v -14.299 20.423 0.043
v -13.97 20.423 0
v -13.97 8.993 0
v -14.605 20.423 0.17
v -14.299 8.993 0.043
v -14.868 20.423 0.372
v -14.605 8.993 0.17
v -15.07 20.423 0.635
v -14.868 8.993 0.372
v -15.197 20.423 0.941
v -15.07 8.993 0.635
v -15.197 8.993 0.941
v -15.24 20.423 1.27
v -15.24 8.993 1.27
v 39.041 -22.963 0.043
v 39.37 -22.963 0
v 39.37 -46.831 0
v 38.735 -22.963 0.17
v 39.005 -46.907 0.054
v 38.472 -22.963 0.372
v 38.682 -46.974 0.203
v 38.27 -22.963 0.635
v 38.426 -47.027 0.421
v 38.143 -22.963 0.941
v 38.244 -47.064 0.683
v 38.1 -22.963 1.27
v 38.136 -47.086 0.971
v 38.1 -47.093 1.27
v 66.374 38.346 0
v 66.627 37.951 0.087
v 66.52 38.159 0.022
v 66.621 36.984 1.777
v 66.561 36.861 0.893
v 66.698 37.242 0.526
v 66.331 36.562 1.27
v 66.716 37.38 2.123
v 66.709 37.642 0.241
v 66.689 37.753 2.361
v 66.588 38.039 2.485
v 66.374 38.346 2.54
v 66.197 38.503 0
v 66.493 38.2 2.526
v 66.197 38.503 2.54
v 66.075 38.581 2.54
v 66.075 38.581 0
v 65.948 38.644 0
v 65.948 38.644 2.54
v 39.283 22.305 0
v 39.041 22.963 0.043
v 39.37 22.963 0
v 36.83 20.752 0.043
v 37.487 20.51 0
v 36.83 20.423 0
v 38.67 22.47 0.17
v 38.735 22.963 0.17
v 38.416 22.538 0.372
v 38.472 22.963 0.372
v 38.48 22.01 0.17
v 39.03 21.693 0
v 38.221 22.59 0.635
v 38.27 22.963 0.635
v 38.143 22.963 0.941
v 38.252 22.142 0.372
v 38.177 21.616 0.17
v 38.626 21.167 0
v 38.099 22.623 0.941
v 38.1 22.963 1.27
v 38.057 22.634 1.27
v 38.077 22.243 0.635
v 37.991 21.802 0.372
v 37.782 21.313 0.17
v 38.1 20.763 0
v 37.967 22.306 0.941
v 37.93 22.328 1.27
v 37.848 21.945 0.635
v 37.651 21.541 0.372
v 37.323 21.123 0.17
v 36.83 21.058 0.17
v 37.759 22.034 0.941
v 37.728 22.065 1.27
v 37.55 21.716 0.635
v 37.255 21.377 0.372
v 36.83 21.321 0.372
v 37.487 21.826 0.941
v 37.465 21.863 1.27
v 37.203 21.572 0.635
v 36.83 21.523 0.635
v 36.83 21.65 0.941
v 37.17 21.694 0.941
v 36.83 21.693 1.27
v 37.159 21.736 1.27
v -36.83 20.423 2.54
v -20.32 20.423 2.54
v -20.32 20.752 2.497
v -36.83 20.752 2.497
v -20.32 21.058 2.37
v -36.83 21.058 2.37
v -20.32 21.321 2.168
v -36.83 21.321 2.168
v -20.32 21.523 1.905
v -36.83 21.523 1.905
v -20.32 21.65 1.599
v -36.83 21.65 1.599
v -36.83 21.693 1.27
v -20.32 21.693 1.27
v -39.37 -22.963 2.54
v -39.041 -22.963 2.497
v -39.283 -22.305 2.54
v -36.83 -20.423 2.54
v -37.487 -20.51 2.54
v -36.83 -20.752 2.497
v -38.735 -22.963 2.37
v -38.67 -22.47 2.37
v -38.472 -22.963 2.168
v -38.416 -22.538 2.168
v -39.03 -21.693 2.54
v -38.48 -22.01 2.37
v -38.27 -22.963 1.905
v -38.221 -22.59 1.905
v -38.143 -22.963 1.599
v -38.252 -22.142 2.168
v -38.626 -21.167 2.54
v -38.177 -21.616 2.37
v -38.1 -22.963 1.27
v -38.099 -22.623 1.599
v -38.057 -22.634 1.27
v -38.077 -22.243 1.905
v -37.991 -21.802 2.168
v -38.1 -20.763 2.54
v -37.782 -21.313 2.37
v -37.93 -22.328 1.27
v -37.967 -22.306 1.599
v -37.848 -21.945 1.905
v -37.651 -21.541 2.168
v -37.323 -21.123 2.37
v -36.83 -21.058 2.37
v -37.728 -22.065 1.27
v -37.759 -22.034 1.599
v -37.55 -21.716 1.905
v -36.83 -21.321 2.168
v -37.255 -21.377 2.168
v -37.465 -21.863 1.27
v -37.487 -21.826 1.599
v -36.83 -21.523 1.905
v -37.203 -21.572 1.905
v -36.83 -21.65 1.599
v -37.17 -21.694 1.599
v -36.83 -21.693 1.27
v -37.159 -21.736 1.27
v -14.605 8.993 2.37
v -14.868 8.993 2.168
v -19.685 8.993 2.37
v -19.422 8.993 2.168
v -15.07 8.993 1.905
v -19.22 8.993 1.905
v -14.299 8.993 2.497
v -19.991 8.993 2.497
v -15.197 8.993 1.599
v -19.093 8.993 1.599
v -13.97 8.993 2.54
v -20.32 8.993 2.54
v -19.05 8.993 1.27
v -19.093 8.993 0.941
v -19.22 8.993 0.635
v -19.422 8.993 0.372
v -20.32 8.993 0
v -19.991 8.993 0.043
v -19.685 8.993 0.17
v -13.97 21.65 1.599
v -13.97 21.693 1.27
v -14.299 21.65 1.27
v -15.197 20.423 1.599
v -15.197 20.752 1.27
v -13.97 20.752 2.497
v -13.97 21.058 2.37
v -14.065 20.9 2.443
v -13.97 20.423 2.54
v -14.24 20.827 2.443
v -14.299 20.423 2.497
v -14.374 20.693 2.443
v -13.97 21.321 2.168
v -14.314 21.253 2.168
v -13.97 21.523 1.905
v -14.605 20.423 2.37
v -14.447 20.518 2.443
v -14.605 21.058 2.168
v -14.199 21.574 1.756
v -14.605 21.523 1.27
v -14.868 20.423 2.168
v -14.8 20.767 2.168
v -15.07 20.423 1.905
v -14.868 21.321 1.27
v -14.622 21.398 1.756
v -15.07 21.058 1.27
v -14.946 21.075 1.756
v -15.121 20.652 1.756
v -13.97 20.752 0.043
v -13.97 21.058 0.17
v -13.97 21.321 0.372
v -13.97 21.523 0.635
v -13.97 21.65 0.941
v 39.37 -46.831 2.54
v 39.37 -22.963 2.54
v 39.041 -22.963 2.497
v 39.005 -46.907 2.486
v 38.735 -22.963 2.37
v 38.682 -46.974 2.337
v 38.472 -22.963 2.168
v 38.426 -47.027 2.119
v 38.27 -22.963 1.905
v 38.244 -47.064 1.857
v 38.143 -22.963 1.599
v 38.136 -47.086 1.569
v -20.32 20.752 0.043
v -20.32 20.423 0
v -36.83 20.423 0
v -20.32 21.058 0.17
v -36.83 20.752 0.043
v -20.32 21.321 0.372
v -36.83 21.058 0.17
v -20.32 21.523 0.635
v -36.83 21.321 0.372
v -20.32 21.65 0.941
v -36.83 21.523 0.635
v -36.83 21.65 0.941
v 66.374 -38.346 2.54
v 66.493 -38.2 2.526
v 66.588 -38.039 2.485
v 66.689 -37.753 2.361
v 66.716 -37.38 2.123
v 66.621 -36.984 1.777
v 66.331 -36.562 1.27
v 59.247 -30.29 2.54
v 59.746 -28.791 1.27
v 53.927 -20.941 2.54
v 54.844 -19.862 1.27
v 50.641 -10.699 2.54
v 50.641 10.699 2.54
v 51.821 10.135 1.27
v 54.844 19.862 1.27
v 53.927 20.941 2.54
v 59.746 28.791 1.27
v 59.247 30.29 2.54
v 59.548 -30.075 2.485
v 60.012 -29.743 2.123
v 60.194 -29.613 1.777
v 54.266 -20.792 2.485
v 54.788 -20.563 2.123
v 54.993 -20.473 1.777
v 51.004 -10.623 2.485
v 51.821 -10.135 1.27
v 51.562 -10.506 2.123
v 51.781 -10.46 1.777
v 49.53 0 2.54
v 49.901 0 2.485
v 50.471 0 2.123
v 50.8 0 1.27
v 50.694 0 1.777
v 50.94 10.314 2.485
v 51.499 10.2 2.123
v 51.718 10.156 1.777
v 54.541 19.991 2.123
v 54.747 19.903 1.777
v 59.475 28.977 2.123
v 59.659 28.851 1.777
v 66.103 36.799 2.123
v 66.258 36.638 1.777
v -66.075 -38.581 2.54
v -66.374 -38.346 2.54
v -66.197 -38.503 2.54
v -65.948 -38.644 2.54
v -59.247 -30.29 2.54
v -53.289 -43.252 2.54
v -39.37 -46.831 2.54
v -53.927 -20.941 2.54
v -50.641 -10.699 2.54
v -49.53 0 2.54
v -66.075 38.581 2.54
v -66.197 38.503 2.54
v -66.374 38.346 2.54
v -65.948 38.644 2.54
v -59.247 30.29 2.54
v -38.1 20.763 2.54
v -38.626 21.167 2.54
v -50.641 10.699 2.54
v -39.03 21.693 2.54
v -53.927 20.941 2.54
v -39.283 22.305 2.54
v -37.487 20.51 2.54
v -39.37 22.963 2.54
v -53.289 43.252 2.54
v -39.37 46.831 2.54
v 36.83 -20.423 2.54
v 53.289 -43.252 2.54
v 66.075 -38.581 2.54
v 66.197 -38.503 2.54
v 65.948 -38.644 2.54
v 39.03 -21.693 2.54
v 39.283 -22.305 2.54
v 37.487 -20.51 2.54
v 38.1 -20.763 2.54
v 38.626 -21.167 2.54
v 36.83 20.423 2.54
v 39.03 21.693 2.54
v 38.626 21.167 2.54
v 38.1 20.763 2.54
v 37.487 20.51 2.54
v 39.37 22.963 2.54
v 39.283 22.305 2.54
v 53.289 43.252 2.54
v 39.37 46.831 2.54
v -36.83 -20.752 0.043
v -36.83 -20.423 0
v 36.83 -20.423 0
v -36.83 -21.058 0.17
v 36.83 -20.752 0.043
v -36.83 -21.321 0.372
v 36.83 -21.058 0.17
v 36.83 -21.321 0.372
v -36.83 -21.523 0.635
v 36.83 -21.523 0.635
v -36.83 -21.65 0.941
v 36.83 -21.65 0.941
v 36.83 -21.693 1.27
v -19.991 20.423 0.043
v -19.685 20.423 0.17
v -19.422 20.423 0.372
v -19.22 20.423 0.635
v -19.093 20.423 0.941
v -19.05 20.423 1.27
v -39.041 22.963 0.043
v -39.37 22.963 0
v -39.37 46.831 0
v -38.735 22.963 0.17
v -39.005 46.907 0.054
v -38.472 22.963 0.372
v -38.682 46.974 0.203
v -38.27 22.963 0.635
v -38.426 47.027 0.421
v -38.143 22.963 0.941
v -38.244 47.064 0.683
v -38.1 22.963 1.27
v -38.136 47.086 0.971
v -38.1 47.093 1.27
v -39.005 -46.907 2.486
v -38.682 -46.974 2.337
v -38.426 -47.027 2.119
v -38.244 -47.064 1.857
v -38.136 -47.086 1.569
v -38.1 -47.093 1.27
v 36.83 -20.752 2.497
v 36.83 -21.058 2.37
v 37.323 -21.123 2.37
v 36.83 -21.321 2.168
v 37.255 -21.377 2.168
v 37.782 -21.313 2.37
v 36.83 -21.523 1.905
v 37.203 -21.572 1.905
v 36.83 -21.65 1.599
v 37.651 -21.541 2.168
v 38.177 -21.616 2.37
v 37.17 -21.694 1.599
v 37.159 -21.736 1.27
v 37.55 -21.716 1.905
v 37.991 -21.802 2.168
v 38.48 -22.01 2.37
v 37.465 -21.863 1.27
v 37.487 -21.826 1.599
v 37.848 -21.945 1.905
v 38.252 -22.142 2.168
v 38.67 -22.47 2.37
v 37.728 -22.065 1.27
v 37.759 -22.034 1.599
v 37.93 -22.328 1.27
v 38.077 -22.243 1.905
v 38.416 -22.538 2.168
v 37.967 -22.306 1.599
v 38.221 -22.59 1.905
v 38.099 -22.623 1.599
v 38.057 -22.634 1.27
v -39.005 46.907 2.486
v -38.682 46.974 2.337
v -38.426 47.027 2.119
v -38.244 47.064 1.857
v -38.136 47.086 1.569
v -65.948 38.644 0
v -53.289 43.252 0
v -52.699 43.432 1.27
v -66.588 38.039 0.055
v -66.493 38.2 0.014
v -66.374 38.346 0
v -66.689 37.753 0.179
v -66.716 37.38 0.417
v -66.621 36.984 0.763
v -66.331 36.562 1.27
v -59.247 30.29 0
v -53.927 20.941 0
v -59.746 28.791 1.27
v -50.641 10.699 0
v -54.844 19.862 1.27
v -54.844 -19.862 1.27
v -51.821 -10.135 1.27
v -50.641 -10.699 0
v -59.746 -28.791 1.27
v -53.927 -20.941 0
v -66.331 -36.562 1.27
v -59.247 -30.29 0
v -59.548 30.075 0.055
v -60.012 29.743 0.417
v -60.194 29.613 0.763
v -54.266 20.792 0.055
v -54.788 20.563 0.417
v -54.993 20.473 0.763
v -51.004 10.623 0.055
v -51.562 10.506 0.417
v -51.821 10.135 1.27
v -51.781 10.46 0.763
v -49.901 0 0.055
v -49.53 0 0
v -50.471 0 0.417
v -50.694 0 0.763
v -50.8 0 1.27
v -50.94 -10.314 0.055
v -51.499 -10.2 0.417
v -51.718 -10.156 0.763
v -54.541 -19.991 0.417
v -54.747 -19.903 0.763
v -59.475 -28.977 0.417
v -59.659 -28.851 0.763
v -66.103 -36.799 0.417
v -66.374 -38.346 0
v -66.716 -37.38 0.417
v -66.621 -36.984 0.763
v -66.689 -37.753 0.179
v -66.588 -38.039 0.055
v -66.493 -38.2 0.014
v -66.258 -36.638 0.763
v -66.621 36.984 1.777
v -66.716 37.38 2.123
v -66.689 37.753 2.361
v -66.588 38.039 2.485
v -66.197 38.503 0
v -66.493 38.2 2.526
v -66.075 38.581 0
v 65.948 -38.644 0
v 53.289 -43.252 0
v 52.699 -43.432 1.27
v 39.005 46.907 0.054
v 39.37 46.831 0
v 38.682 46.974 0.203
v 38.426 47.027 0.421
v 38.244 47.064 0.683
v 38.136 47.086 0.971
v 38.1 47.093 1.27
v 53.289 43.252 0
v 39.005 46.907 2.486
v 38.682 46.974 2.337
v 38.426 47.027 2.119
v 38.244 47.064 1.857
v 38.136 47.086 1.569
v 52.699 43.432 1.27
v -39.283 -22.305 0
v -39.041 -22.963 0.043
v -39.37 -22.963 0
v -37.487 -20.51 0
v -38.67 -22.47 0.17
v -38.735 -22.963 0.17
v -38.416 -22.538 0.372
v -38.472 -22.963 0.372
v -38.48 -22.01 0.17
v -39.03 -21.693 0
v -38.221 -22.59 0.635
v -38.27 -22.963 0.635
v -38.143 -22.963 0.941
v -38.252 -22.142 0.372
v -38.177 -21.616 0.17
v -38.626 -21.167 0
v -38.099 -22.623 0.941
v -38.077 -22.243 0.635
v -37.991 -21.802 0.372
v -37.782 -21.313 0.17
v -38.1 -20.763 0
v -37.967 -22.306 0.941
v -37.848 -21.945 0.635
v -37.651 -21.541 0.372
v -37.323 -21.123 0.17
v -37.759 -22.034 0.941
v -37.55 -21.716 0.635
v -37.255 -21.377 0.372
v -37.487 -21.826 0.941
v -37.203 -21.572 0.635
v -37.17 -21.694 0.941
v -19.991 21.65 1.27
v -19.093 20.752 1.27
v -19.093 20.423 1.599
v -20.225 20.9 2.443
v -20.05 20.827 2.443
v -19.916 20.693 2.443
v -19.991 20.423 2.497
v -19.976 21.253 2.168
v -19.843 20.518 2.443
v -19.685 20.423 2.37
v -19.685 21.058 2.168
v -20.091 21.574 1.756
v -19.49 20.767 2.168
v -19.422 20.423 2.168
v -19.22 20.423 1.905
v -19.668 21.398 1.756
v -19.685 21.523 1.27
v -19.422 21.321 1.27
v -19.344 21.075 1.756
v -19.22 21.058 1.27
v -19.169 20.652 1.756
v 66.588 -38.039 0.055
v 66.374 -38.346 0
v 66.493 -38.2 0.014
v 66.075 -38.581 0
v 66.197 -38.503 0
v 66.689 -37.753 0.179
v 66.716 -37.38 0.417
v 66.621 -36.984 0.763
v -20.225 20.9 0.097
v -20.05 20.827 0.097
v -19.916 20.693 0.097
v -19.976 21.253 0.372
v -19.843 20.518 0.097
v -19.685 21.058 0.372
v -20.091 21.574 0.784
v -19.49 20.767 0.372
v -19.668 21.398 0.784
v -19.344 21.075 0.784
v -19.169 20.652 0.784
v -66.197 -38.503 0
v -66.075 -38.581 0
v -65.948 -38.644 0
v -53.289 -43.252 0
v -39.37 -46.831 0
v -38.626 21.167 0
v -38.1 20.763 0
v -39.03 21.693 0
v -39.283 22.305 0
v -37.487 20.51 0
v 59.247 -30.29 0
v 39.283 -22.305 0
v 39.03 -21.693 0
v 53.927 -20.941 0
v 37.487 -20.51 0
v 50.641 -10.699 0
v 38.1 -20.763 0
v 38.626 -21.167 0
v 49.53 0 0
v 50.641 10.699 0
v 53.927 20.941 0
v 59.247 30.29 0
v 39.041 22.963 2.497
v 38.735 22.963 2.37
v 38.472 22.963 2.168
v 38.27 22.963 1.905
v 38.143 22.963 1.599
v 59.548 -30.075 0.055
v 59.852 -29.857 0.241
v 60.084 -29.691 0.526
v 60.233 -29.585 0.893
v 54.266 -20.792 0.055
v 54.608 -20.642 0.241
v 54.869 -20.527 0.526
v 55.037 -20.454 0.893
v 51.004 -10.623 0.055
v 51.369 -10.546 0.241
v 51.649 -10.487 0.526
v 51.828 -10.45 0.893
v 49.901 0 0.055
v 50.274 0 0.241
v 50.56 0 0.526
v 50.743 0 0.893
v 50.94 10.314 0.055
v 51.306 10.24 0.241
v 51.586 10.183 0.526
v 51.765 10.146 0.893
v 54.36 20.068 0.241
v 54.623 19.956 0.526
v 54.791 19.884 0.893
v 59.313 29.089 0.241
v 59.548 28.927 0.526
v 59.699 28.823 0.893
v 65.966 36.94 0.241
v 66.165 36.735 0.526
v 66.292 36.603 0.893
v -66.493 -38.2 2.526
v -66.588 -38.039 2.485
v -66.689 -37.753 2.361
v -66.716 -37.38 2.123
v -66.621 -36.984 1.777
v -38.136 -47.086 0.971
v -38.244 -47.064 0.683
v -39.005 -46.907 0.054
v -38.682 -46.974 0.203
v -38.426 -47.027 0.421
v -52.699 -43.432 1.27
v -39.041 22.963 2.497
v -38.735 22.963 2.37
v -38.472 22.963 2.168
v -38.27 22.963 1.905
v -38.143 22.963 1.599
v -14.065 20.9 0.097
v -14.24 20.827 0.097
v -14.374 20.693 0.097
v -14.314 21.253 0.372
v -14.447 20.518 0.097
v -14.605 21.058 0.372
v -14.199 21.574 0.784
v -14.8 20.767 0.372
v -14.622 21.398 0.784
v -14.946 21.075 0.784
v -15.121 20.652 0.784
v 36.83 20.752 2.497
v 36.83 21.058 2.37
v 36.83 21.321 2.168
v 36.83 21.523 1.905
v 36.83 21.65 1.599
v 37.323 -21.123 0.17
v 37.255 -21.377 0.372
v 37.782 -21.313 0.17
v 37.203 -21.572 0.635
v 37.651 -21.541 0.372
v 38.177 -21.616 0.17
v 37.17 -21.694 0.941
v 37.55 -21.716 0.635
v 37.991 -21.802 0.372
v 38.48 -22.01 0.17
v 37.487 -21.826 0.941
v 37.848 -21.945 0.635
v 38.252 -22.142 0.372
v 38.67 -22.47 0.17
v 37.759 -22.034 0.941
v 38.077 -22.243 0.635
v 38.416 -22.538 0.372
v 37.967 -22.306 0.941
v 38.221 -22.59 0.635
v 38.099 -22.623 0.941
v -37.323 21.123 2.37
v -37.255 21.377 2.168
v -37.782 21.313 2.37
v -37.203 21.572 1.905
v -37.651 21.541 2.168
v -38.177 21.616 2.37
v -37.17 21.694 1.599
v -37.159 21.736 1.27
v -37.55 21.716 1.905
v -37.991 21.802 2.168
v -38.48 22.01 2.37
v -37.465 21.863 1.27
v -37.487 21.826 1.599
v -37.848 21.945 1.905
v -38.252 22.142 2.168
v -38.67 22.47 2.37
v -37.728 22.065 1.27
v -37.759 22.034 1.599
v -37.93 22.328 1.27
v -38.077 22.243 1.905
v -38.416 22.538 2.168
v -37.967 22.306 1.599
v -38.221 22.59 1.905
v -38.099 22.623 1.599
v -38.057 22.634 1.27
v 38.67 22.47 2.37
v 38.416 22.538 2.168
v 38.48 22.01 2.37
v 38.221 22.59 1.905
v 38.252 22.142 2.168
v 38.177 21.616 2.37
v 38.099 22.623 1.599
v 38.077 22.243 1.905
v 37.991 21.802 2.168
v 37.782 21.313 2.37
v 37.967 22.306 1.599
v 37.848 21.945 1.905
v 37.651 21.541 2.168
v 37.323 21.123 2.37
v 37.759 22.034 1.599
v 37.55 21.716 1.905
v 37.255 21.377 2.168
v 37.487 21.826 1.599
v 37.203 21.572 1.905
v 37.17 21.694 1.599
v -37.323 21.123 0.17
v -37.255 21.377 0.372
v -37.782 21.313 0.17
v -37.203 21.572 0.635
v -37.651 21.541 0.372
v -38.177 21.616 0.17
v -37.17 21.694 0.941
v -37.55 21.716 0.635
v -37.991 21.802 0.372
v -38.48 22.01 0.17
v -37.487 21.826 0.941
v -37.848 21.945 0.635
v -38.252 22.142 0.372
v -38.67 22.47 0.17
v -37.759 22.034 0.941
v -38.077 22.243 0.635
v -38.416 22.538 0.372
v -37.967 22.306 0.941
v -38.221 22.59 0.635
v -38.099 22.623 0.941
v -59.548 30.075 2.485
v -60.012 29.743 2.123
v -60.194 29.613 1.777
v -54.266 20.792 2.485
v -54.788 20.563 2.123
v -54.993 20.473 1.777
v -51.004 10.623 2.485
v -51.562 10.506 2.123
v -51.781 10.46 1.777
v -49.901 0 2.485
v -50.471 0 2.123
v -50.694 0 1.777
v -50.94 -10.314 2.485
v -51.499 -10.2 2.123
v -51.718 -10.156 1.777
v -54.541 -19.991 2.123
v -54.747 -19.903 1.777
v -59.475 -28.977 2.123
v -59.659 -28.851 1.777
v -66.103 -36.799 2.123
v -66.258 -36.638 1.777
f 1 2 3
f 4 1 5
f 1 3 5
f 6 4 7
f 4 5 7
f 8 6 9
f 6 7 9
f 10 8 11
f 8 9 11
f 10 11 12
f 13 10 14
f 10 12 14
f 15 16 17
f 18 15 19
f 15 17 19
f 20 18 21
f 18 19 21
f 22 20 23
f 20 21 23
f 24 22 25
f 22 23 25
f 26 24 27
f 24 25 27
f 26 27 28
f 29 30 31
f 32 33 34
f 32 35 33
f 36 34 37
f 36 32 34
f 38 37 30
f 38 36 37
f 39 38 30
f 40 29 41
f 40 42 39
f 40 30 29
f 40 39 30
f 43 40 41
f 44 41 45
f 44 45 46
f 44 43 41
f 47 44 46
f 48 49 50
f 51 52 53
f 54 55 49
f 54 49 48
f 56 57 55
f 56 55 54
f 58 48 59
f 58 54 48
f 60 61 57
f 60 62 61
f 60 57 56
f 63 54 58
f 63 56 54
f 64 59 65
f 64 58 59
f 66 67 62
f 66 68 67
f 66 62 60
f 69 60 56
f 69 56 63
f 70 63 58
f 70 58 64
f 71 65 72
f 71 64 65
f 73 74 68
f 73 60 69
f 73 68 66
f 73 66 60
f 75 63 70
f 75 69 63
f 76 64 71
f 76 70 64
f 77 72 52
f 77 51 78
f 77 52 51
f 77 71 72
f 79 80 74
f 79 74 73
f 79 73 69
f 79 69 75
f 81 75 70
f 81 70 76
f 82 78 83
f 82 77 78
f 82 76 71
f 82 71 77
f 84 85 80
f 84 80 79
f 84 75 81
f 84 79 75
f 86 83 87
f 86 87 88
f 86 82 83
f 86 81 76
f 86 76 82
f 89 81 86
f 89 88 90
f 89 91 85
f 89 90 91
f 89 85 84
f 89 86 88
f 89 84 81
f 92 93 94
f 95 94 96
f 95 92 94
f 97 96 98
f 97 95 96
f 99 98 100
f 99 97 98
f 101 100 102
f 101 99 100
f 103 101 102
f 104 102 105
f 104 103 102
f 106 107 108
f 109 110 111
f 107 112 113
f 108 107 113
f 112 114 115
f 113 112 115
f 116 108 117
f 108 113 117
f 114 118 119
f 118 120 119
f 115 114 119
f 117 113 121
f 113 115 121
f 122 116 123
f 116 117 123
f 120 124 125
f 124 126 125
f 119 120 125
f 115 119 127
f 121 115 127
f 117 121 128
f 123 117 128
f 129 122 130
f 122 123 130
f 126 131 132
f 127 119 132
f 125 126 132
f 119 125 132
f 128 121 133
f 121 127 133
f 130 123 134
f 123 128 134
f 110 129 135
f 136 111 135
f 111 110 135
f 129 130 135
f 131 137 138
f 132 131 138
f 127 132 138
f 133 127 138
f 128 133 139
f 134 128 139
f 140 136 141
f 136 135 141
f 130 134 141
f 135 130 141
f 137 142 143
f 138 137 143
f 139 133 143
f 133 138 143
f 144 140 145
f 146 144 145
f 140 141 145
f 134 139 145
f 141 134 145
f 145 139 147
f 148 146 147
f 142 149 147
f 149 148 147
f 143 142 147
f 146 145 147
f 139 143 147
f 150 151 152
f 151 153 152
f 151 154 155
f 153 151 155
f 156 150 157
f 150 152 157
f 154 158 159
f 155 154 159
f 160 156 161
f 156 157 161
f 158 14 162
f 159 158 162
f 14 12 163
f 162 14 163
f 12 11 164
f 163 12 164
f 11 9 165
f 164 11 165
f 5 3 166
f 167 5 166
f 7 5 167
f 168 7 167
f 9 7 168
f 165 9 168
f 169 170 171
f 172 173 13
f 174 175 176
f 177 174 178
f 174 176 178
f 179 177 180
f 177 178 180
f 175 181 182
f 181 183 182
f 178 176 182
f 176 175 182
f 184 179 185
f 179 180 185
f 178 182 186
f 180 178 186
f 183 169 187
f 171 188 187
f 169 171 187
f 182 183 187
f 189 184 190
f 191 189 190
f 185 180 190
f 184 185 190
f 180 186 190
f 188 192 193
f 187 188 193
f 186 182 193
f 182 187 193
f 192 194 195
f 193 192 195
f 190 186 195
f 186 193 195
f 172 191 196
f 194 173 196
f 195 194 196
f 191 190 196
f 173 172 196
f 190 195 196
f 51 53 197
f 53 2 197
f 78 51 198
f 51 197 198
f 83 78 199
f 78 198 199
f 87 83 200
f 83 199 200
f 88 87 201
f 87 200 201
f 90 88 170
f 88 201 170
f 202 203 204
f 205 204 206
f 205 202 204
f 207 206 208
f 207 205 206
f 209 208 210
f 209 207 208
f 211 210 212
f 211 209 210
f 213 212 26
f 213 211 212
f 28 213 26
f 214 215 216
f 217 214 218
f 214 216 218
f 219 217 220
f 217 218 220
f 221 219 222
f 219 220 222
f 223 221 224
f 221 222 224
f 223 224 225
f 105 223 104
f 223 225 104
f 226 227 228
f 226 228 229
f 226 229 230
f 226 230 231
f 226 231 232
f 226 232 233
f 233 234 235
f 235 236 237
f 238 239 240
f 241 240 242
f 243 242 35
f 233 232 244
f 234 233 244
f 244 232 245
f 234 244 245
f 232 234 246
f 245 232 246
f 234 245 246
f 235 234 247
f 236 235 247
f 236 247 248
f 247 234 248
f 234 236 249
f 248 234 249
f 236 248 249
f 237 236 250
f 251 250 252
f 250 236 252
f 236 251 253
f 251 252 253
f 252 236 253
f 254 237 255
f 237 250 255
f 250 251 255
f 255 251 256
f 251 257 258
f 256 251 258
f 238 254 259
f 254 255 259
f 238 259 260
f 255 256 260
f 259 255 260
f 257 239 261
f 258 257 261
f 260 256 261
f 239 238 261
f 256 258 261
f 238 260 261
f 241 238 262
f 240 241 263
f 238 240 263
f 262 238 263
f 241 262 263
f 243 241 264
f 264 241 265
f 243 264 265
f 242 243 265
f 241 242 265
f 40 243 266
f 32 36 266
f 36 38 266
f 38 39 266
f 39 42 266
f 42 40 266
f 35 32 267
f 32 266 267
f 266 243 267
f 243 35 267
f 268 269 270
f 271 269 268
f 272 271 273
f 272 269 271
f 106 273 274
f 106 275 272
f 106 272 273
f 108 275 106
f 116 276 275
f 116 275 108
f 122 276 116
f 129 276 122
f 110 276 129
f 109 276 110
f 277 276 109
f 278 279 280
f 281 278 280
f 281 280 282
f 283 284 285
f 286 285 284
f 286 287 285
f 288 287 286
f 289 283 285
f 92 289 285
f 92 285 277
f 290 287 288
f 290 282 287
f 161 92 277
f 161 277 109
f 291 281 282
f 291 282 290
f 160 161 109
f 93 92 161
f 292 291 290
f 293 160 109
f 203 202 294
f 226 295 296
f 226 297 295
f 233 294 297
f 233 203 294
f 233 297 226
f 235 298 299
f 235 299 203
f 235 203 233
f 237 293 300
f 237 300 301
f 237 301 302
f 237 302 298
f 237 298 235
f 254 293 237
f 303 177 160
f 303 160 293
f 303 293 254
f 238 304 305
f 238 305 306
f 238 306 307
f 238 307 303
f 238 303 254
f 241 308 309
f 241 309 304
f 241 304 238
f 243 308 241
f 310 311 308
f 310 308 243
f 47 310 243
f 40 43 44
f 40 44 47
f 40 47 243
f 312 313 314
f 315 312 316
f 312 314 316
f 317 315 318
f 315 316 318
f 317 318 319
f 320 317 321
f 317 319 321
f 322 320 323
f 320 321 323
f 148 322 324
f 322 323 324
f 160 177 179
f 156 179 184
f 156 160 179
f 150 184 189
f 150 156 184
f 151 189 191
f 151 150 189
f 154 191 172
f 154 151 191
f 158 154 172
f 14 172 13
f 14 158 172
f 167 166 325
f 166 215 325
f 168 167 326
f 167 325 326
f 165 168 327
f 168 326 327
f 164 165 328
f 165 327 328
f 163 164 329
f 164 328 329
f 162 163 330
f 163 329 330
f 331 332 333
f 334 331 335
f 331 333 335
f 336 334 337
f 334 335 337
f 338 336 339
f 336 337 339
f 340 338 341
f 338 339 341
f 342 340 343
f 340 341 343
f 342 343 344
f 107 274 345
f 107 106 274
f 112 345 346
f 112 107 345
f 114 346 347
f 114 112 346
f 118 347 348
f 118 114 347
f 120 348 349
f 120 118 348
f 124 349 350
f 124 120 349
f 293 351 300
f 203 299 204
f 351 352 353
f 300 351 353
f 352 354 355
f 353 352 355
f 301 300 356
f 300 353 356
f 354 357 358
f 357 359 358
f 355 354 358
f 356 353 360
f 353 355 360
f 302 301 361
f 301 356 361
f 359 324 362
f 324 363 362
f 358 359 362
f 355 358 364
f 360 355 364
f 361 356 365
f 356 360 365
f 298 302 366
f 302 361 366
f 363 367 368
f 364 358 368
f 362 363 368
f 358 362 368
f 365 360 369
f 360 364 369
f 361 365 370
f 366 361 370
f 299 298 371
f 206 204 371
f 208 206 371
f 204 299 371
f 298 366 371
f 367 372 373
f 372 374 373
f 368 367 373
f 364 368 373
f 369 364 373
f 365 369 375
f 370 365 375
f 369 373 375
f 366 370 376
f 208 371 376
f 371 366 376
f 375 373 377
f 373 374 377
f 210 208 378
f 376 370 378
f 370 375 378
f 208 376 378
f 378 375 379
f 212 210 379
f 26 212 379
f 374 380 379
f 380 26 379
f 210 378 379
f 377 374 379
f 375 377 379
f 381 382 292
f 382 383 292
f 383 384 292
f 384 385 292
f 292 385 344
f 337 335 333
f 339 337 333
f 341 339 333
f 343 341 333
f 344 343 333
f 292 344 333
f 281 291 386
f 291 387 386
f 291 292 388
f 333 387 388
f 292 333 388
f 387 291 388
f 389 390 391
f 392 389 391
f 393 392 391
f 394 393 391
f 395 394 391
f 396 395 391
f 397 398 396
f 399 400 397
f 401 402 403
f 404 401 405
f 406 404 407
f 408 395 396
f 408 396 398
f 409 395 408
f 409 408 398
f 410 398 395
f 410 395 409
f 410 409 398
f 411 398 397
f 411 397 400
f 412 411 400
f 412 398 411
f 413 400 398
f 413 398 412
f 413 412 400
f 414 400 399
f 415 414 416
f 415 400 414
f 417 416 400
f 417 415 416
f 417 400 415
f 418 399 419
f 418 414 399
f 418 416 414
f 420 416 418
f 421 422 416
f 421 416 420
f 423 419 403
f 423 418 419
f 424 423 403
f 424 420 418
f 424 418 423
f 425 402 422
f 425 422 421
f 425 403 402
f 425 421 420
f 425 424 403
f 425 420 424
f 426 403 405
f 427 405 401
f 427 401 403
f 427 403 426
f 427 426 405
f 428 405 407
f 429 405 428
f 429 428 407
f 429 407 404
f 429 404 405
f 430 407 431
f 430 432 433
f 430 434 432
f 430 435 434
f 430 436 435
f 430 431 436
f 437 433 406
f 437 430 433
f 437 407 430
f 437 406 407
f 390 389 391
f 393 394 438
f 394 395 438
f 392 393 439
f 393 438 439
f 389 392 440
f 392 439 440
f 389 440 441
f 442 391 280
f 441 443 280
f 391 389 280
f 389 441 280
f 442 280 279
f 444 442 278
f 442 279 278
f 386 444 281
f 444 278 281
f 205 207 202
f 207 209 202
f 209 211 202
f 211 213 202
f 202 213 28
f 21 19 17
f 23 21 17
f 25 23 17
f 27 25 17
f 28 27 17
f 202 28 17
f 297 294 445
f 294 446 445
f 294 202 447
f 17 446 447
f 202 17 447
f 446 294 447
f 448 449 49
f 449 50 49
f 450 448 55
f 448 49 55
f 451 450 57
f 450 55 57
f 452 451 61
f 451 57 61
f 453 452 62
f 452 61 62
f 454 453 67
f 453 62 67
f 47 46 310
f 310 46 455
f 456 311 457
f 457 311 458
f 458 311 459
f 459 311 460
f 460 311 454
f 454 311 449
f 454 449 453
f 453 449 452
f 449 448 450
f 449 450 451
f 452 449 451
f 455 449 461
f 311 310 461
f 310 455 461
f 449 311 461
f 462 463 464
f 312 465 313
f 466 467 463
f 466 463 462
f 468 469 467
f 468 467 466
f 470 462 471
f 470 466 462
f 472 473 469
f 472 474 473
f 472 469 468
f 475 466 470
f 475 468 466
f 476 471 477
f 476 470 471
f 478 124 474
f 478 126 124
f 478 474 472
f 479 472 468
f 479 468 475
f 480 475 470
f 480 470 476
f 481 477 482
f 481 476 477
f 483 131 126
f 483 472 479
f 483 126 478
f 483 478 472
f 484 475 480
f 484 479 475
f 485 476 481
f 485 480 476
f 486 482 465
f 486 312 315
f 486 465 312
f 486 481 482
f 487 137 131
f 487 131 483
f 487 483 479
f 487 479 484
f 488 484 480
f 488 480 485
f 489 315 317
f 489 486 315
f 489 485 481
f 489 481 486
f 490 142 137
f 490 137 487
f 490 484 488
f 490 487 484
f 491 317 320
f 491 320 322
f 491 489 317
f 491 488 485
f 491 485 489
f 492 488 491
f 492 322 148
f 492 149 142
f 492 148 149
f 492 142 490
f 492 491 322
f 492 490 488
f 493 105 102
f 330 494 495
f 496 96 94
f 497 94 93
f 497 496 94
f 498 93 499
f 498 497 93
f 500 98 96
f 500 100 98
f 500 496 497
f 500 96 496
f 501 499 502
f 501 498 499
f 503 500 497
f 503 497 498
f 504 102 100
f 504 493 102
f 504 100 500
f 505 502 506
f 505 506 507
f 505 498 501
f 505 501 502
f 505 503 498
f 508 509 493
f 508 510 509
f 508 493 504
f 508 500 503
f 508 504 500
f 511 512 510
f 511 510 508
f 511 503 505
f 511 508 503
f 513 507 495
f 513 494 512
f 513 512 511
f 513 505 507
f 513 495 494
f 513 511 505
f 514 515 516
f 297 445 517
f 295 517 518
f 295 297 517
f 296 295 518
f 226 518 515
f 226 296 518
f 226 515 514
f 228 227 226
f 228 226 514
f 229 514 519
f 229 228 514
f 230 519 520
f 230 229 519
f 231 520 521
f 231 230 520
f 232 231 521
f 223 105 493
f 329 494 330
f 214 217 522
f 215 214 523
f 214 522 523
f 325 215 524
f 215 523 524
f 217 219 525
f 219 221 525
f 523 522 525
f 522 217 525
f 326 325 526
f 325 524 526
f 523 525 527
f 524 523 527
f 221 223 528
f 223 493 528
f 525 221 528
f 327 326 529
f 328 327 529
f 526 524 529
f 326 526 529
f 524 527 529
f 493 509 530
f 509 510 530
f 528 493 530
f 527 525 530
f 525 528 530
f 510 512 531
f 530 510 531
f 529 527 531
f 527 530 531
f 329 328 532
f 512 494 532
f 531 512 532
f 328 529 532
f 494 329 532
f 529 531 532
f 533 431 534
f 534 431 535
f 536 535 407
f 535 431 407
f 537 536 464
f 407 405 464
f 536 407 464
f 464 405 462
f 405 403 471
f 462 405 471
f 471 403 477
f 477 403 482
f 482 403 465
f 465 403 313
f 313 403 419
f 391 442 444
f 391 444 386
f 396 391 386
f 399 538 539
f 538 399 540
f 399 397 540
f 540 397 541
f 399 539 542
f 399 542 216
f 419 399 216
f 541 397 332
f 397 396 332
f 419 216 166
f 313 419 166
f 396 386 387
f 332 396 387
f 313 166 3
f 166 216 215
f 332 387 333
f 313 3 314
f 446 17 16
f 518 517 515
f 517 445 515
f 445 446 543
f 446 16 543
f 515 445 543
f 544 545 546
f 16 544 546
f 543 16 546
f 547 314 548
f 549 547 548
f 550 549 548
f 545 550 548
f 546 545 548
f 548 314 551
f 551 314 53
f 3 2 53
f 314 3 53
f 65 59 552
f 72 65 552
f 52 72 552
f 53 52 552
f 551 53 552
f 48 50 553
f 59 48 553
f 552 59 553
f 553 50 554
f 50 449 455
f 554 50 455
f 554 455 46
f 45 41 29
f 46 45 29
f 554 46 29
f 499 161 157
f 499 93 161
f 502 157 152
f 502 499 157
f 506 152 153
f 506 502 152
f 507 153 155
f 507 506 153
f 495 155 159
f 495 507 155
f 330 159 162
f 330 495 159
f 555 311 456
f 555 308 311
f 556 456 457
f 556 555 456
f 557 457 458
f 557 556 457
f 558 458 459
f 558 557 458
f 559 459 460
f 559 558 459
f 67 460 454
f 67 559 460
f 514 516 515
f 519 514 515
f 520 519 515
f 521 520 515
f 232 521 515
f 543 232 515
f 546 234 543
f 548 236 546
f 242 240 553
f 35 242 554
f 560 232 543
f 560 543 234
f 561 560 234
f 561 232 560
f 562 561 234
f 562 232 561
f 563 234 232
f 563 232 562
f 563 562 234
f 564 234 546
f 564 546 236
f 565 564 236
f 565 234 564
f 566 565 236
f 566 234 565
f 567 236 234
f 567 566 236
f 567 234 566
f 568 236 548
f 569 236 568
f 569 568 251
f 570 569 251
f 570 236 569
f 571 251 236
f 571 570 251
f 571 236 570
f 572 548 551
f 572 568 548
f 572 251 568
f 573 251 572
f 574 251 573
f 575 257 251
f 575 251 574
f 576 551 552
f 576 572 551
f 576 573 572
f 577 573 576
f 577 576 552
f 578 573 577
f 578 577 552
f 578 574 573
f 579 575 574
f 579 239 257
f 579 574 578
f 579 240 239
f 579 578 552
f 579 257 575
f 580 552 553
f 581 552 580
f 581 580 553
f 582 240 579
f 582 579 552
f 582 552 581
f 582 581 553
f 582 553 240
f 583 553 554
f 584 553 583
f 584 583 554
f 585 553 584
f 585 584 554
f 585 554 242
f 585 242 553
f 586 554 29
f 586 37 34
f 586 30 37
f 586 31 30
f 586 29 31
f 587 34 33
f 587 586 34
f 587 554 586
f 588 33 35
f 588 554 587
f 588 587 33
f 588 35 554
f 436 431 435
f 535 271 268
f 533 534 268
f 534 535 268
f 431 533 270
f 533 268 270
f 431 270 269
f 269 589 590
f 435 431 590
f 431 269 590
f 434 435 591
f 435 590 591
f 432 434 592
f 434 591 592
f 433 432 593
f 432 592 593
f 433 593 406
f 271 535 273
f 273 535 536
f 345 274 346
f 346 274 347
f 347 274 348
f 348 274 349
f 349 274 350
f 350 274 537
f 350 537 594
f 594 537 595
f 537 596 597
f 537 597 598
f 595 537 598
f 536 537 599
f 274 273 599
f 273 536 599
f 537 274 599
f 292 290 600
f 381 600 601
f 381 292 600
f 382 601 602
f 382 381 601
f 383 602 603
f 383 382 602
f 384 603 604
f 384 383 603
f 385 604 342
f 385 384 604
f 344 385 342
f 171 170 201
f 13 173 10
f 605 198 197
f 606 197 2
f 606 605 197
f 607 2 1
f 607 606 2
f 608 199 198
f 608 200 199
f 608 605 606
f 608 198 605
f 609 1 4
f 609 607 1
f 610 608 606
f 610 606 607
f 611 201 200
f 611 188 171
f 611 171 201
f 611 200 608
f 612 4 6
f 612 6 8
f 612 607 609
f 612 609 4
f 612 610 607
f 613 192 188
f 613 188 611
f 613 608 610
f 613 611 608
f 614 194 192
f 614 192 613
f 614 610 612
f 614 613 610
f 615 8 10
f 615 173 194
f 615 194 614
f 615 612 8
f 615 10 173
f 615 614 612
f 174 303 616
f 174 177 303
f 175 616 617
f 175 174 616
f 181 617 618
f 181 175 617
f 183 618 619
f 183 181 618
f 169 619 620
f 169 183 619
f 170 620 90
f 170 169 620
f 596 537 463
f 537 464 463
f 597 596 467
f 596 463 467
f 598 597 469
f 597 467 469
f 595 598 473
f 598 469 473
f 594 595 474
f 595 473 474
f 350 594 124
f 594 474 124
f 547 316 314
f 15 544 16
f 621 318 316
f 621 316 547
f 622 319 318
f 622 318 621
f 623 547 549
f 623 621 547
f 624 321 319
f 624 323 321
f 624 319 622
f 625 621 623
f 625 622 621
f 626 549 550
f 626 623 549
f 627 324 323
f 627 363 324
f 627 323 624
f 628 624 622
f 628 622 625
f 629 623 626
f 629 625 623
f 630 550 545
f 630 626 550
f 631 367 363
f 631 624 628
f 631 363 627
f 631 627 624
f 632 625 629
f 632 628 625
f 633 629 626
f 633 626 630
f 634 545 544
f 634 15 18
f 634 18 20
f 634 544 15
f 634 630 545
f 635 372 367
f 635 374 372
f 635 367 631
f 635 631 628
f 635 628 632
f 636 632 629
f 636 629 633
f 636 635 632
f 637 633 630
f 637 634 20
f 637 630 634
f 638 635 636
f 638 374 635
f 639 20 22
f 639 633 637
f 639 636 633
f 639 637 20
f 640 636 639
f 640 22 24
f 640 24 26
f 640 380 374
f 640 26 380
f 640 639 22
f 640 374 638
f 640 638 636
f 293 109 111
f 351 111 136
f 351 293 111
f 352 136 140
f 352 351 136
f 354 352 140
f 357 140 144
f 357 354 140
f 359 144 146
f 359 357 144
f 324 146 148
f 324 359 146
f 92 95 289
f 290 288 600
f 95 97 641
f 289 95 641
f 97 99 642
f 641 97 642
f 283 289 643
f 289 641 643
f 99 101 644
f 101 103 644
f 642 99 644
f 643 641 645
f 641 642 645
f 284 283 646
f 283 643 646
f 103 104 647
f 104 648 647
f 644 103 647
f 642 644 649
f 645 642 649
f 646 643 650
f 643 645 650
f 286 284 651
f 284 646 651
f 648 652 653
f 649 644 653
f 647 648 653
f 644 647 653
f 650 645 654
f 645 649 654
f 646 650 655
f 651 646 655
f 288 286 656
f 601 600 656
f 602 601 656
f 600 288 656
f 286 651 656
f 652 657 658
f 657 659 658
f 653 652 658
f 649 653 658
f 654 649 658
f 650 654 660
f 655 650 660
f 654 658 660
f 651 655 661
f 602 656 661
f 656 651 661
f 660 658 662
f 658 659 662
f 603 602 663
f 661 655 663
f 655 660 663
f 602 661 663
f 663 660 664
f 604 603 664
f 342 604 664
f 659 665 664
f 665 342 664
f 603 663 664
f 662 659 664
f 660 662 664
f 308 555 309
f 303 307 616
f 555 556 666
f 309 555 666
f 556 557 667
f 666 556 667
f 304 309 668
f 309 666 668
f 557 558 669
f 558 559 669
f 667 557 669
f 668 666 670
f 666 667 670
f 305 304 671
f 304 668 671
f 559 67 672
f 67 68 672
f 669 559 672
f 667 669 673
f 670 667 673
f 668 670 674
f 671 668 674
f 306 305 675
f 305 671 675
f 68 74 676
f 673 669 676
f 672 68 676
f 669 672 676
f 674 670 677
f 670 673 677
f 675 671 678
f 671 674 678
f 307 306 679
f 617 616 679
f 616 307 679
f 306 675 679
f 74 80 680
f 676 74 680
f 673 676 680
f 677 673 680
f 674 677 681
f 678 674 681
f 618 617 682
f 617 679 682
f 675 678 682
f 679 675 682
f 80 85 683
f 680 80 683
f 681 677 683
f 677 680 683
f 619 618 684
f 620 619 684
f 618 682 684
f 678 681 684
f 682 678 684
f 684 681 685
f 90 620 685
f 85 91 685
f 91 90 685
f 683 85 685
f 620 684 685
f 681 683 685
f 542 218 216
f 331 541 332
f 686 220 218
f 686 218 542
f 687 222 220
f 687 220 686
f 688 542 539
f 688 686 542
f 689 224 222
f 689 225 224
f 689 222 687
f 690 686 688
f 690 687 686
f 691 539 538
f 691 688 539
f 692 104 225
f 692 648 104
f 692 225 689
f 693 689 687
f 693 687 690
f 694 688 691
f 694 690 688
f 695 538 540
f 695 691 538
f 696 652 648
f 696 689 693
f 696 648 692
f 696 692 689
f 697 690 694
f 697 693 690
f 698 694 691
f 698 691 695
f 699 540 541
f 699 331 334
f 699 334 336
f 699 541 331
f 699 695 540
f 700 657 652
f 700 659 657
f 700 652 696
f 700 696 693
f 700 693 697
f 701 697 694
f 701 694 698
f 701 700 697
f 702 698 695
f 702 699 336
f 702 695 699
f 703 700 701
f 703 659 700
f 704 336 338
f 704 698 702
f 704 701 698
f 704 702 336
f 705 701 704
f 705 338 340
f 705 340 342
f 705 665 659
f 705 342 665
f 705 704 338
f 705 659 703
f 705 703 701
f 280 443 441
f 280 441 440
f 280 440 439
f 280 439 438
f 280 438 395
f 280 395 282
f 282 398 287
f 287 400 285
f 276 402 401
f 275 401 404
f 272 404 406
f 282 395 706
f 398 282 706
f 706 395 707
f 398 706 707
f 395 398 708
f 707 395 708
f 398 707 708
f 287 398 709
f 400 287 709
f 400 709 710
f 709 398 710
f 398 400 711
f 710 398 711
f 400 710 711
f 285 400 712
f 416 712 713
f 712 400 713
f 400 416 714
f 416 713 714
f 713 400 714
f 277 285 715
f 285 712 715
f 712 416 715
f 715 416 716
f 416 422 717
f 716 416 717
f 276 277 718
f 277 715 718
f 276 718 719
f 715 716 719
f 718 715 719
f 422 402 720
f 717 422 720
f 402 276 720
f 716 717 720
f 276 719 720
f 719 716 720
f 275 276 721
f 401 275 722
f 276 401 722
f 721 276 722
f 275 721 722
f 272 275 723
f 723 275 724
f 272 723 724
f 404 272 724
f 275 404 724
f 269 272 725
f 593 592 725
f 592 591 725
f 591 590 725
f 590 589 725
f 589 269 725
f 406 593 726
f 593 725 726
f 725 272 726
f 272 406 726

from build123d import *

# Parameters (mm, degrees)
F1_DEPTH = 2.54
F2_F1_R  = 1.27
F2_F2_R  = 1.2699


# Not quite as in the source:
# - a fillet or chamfer is up to 0.001 mm smaller than in the source, because OpenCascade refuses the exact size


with BuildPart() as f1:
    # F0 (on Top) → F1 (new body)
    with BuildSketch(Plane.XY):
        with BuildLine():
            ThreePointArc((-50.8, 0), (-55.2261567979, -20.7390131556), (-67.7333333333, -37.864084419))
            add(Edge.make_bspline(
                [(-67.7333333333, -37.864084419), (-54.52618426, -43.7705010424), (-38.1, -47.0928603931)],
                knots=[3.9826613242, 3.9826613242, 3.9826613242, 4.3279922059, 4.3279922059, 4.3279922059], degree=2, weights=[1, 0.9851303208, 1]))
            Line((-38.1, -47.0928603931), (-38.1, -21.6928603931))
            Line((-38.1, -21.6928603931), (38.1, -21.6928603931))
            Line((38.1, -21.6928603931), (38.1, -47.0928603931))
            add(Edge.make_bspline(
                [(38.1, -47.0928603931), (54.52618426, -43.7705010424), (67.7333333333, -37.864084419)],
                knots=[5.0967857549, 5.0967857549, 5.0967857549, 5.4421166366, 5.4421166366, 5.4421166366], degree=2, weights=[1, 0.9851303208, 1]))
            ThreePointArc((67.7333333333, -37.864084419), (55.2261567979, -20.7390131556), (50.8, 0))
            ThreePointArc((50.8, 0), (55.2261567979, 20.7390131556), (67.7333333333, 37.864084419))
            add(Edge.make_bspline(
                [(67.7333333333, 37.864084419), (54.52618426, 43.7705010424), (38.1, 47.0928603931)],
                knots=[0.8410686706, 0.8410686706, 0.8410686706, 1.1863995523, 1.1863995523, 1.1863995523], degree=2, weights=[1, 0.9851303208, 1]))
            Line((38.1, 47.0928603931), (38.1, 21.6928603931))
            Line((38.1, 21.6928603931), (-15.24, 21.6928603931))
            Line((-15.24, 21.6928603931), (-15.24, 8.9928603931))
            Line((-15.24, 8.9928603931), (-19.05, 8.9928603931))
            Line((-19.05, 8.9928603931), (-19.05, 21.6928603931))
            Line((-19.05, 21.6928603931), (-38.1, 21.6928603931))
            Line((-38.1, 21.6928603931), (-38.1, 47.0928603931))
            add(Edge.make_bspline(
                [(-38.1, 47.0928603931), (-54.52618426, 43.7705010424), (-67.7333333333, 37.864084419)],
                knots=[1.9551931013, 1.9551931013, 1.9551931013, 2.300523983, 2.300523983, 2.300523983], degree=2, weights=[1, 0.9851303208, 1]))
            ThreePointArc((-67.7333333333, 37.864084419), (-55.2261567979, 20.7390131556), (-50.8, 0))
        make_face()
    extrude(amount=F1_DEPTH)

    # F2: fillet of radius 1.27 on 24 edges, made by hand

    # F2_f1
    f2_f1_edges = [f1.edges().sort_by_distance(p)[0] for p in [
        (-38.1, -21.6928603931, 1.27),
        (38.1, -21.6928603931, 1.27),
        (38.1, 21.6928603931, 1.27),
        (-38.1, 21.6928603931, 1.27),
    ]]
    fillet(f2_f1_edges, radius=F2_F1_R)

    # F2_f2 (radius 1.27 in the source; OpenCascade refuses exactly that, so slightly less here)
    f2_f2_edges = [f1.edges().sort_by_distance(p)[0] for p in [
        (67.7333333333, -37.864084419, 1.27),
        (50.8, 0, 2.54),
        (67.7333333333, 37.864084419, 1.27),
        (50.8, 0, 0),
        (0, -21.6928603931, 0),
        (0, -21.6928603931, 2.54),
        (-67.7333333333, 37.864084419, 1.27),
        (-50.8, 0, 2.54),
        (-67.7333333333, -37.864084419, 1.27),
        (-50.8, 0, 0),
        (-15.24, 21.6928603931, 1.27),
        (10.795, 21.6928603931, 0),
        (10.795, 21.6928603931, 2.54),
        (-19.05, 21.6928603931, 1.27),
        (-27.94, 21.6928603931, 0),
        (-27.94, 21.6928603931, 2.54),
        (-15.24, 15.3428603931, 2.54),
        (-19.05, 15.3428603931, 2.54),
        (-15.24, 15.3428603931, 0),
        (-19.05, 15.3428603931, 0),
        (-37.7280256121, 22.064834781, 2.54),
        (-37.7280256121, 22.064834781, 0),
        (37.7280256121, 22.064834781, 2.54),
        (37.7280256121, 22.064834781, 0),
        (-37.7280256121, -22.064834781, 2.54),
        (37.7280256121, -22.064834781, 2.54),
        (-37.7280256121, -22.064834781, 0),
        (37.7280256121, -22.064834781, 0),
    ]]
    fillet(f2_f2_edges, radius=F2_F2_R)


solid = f1.part
